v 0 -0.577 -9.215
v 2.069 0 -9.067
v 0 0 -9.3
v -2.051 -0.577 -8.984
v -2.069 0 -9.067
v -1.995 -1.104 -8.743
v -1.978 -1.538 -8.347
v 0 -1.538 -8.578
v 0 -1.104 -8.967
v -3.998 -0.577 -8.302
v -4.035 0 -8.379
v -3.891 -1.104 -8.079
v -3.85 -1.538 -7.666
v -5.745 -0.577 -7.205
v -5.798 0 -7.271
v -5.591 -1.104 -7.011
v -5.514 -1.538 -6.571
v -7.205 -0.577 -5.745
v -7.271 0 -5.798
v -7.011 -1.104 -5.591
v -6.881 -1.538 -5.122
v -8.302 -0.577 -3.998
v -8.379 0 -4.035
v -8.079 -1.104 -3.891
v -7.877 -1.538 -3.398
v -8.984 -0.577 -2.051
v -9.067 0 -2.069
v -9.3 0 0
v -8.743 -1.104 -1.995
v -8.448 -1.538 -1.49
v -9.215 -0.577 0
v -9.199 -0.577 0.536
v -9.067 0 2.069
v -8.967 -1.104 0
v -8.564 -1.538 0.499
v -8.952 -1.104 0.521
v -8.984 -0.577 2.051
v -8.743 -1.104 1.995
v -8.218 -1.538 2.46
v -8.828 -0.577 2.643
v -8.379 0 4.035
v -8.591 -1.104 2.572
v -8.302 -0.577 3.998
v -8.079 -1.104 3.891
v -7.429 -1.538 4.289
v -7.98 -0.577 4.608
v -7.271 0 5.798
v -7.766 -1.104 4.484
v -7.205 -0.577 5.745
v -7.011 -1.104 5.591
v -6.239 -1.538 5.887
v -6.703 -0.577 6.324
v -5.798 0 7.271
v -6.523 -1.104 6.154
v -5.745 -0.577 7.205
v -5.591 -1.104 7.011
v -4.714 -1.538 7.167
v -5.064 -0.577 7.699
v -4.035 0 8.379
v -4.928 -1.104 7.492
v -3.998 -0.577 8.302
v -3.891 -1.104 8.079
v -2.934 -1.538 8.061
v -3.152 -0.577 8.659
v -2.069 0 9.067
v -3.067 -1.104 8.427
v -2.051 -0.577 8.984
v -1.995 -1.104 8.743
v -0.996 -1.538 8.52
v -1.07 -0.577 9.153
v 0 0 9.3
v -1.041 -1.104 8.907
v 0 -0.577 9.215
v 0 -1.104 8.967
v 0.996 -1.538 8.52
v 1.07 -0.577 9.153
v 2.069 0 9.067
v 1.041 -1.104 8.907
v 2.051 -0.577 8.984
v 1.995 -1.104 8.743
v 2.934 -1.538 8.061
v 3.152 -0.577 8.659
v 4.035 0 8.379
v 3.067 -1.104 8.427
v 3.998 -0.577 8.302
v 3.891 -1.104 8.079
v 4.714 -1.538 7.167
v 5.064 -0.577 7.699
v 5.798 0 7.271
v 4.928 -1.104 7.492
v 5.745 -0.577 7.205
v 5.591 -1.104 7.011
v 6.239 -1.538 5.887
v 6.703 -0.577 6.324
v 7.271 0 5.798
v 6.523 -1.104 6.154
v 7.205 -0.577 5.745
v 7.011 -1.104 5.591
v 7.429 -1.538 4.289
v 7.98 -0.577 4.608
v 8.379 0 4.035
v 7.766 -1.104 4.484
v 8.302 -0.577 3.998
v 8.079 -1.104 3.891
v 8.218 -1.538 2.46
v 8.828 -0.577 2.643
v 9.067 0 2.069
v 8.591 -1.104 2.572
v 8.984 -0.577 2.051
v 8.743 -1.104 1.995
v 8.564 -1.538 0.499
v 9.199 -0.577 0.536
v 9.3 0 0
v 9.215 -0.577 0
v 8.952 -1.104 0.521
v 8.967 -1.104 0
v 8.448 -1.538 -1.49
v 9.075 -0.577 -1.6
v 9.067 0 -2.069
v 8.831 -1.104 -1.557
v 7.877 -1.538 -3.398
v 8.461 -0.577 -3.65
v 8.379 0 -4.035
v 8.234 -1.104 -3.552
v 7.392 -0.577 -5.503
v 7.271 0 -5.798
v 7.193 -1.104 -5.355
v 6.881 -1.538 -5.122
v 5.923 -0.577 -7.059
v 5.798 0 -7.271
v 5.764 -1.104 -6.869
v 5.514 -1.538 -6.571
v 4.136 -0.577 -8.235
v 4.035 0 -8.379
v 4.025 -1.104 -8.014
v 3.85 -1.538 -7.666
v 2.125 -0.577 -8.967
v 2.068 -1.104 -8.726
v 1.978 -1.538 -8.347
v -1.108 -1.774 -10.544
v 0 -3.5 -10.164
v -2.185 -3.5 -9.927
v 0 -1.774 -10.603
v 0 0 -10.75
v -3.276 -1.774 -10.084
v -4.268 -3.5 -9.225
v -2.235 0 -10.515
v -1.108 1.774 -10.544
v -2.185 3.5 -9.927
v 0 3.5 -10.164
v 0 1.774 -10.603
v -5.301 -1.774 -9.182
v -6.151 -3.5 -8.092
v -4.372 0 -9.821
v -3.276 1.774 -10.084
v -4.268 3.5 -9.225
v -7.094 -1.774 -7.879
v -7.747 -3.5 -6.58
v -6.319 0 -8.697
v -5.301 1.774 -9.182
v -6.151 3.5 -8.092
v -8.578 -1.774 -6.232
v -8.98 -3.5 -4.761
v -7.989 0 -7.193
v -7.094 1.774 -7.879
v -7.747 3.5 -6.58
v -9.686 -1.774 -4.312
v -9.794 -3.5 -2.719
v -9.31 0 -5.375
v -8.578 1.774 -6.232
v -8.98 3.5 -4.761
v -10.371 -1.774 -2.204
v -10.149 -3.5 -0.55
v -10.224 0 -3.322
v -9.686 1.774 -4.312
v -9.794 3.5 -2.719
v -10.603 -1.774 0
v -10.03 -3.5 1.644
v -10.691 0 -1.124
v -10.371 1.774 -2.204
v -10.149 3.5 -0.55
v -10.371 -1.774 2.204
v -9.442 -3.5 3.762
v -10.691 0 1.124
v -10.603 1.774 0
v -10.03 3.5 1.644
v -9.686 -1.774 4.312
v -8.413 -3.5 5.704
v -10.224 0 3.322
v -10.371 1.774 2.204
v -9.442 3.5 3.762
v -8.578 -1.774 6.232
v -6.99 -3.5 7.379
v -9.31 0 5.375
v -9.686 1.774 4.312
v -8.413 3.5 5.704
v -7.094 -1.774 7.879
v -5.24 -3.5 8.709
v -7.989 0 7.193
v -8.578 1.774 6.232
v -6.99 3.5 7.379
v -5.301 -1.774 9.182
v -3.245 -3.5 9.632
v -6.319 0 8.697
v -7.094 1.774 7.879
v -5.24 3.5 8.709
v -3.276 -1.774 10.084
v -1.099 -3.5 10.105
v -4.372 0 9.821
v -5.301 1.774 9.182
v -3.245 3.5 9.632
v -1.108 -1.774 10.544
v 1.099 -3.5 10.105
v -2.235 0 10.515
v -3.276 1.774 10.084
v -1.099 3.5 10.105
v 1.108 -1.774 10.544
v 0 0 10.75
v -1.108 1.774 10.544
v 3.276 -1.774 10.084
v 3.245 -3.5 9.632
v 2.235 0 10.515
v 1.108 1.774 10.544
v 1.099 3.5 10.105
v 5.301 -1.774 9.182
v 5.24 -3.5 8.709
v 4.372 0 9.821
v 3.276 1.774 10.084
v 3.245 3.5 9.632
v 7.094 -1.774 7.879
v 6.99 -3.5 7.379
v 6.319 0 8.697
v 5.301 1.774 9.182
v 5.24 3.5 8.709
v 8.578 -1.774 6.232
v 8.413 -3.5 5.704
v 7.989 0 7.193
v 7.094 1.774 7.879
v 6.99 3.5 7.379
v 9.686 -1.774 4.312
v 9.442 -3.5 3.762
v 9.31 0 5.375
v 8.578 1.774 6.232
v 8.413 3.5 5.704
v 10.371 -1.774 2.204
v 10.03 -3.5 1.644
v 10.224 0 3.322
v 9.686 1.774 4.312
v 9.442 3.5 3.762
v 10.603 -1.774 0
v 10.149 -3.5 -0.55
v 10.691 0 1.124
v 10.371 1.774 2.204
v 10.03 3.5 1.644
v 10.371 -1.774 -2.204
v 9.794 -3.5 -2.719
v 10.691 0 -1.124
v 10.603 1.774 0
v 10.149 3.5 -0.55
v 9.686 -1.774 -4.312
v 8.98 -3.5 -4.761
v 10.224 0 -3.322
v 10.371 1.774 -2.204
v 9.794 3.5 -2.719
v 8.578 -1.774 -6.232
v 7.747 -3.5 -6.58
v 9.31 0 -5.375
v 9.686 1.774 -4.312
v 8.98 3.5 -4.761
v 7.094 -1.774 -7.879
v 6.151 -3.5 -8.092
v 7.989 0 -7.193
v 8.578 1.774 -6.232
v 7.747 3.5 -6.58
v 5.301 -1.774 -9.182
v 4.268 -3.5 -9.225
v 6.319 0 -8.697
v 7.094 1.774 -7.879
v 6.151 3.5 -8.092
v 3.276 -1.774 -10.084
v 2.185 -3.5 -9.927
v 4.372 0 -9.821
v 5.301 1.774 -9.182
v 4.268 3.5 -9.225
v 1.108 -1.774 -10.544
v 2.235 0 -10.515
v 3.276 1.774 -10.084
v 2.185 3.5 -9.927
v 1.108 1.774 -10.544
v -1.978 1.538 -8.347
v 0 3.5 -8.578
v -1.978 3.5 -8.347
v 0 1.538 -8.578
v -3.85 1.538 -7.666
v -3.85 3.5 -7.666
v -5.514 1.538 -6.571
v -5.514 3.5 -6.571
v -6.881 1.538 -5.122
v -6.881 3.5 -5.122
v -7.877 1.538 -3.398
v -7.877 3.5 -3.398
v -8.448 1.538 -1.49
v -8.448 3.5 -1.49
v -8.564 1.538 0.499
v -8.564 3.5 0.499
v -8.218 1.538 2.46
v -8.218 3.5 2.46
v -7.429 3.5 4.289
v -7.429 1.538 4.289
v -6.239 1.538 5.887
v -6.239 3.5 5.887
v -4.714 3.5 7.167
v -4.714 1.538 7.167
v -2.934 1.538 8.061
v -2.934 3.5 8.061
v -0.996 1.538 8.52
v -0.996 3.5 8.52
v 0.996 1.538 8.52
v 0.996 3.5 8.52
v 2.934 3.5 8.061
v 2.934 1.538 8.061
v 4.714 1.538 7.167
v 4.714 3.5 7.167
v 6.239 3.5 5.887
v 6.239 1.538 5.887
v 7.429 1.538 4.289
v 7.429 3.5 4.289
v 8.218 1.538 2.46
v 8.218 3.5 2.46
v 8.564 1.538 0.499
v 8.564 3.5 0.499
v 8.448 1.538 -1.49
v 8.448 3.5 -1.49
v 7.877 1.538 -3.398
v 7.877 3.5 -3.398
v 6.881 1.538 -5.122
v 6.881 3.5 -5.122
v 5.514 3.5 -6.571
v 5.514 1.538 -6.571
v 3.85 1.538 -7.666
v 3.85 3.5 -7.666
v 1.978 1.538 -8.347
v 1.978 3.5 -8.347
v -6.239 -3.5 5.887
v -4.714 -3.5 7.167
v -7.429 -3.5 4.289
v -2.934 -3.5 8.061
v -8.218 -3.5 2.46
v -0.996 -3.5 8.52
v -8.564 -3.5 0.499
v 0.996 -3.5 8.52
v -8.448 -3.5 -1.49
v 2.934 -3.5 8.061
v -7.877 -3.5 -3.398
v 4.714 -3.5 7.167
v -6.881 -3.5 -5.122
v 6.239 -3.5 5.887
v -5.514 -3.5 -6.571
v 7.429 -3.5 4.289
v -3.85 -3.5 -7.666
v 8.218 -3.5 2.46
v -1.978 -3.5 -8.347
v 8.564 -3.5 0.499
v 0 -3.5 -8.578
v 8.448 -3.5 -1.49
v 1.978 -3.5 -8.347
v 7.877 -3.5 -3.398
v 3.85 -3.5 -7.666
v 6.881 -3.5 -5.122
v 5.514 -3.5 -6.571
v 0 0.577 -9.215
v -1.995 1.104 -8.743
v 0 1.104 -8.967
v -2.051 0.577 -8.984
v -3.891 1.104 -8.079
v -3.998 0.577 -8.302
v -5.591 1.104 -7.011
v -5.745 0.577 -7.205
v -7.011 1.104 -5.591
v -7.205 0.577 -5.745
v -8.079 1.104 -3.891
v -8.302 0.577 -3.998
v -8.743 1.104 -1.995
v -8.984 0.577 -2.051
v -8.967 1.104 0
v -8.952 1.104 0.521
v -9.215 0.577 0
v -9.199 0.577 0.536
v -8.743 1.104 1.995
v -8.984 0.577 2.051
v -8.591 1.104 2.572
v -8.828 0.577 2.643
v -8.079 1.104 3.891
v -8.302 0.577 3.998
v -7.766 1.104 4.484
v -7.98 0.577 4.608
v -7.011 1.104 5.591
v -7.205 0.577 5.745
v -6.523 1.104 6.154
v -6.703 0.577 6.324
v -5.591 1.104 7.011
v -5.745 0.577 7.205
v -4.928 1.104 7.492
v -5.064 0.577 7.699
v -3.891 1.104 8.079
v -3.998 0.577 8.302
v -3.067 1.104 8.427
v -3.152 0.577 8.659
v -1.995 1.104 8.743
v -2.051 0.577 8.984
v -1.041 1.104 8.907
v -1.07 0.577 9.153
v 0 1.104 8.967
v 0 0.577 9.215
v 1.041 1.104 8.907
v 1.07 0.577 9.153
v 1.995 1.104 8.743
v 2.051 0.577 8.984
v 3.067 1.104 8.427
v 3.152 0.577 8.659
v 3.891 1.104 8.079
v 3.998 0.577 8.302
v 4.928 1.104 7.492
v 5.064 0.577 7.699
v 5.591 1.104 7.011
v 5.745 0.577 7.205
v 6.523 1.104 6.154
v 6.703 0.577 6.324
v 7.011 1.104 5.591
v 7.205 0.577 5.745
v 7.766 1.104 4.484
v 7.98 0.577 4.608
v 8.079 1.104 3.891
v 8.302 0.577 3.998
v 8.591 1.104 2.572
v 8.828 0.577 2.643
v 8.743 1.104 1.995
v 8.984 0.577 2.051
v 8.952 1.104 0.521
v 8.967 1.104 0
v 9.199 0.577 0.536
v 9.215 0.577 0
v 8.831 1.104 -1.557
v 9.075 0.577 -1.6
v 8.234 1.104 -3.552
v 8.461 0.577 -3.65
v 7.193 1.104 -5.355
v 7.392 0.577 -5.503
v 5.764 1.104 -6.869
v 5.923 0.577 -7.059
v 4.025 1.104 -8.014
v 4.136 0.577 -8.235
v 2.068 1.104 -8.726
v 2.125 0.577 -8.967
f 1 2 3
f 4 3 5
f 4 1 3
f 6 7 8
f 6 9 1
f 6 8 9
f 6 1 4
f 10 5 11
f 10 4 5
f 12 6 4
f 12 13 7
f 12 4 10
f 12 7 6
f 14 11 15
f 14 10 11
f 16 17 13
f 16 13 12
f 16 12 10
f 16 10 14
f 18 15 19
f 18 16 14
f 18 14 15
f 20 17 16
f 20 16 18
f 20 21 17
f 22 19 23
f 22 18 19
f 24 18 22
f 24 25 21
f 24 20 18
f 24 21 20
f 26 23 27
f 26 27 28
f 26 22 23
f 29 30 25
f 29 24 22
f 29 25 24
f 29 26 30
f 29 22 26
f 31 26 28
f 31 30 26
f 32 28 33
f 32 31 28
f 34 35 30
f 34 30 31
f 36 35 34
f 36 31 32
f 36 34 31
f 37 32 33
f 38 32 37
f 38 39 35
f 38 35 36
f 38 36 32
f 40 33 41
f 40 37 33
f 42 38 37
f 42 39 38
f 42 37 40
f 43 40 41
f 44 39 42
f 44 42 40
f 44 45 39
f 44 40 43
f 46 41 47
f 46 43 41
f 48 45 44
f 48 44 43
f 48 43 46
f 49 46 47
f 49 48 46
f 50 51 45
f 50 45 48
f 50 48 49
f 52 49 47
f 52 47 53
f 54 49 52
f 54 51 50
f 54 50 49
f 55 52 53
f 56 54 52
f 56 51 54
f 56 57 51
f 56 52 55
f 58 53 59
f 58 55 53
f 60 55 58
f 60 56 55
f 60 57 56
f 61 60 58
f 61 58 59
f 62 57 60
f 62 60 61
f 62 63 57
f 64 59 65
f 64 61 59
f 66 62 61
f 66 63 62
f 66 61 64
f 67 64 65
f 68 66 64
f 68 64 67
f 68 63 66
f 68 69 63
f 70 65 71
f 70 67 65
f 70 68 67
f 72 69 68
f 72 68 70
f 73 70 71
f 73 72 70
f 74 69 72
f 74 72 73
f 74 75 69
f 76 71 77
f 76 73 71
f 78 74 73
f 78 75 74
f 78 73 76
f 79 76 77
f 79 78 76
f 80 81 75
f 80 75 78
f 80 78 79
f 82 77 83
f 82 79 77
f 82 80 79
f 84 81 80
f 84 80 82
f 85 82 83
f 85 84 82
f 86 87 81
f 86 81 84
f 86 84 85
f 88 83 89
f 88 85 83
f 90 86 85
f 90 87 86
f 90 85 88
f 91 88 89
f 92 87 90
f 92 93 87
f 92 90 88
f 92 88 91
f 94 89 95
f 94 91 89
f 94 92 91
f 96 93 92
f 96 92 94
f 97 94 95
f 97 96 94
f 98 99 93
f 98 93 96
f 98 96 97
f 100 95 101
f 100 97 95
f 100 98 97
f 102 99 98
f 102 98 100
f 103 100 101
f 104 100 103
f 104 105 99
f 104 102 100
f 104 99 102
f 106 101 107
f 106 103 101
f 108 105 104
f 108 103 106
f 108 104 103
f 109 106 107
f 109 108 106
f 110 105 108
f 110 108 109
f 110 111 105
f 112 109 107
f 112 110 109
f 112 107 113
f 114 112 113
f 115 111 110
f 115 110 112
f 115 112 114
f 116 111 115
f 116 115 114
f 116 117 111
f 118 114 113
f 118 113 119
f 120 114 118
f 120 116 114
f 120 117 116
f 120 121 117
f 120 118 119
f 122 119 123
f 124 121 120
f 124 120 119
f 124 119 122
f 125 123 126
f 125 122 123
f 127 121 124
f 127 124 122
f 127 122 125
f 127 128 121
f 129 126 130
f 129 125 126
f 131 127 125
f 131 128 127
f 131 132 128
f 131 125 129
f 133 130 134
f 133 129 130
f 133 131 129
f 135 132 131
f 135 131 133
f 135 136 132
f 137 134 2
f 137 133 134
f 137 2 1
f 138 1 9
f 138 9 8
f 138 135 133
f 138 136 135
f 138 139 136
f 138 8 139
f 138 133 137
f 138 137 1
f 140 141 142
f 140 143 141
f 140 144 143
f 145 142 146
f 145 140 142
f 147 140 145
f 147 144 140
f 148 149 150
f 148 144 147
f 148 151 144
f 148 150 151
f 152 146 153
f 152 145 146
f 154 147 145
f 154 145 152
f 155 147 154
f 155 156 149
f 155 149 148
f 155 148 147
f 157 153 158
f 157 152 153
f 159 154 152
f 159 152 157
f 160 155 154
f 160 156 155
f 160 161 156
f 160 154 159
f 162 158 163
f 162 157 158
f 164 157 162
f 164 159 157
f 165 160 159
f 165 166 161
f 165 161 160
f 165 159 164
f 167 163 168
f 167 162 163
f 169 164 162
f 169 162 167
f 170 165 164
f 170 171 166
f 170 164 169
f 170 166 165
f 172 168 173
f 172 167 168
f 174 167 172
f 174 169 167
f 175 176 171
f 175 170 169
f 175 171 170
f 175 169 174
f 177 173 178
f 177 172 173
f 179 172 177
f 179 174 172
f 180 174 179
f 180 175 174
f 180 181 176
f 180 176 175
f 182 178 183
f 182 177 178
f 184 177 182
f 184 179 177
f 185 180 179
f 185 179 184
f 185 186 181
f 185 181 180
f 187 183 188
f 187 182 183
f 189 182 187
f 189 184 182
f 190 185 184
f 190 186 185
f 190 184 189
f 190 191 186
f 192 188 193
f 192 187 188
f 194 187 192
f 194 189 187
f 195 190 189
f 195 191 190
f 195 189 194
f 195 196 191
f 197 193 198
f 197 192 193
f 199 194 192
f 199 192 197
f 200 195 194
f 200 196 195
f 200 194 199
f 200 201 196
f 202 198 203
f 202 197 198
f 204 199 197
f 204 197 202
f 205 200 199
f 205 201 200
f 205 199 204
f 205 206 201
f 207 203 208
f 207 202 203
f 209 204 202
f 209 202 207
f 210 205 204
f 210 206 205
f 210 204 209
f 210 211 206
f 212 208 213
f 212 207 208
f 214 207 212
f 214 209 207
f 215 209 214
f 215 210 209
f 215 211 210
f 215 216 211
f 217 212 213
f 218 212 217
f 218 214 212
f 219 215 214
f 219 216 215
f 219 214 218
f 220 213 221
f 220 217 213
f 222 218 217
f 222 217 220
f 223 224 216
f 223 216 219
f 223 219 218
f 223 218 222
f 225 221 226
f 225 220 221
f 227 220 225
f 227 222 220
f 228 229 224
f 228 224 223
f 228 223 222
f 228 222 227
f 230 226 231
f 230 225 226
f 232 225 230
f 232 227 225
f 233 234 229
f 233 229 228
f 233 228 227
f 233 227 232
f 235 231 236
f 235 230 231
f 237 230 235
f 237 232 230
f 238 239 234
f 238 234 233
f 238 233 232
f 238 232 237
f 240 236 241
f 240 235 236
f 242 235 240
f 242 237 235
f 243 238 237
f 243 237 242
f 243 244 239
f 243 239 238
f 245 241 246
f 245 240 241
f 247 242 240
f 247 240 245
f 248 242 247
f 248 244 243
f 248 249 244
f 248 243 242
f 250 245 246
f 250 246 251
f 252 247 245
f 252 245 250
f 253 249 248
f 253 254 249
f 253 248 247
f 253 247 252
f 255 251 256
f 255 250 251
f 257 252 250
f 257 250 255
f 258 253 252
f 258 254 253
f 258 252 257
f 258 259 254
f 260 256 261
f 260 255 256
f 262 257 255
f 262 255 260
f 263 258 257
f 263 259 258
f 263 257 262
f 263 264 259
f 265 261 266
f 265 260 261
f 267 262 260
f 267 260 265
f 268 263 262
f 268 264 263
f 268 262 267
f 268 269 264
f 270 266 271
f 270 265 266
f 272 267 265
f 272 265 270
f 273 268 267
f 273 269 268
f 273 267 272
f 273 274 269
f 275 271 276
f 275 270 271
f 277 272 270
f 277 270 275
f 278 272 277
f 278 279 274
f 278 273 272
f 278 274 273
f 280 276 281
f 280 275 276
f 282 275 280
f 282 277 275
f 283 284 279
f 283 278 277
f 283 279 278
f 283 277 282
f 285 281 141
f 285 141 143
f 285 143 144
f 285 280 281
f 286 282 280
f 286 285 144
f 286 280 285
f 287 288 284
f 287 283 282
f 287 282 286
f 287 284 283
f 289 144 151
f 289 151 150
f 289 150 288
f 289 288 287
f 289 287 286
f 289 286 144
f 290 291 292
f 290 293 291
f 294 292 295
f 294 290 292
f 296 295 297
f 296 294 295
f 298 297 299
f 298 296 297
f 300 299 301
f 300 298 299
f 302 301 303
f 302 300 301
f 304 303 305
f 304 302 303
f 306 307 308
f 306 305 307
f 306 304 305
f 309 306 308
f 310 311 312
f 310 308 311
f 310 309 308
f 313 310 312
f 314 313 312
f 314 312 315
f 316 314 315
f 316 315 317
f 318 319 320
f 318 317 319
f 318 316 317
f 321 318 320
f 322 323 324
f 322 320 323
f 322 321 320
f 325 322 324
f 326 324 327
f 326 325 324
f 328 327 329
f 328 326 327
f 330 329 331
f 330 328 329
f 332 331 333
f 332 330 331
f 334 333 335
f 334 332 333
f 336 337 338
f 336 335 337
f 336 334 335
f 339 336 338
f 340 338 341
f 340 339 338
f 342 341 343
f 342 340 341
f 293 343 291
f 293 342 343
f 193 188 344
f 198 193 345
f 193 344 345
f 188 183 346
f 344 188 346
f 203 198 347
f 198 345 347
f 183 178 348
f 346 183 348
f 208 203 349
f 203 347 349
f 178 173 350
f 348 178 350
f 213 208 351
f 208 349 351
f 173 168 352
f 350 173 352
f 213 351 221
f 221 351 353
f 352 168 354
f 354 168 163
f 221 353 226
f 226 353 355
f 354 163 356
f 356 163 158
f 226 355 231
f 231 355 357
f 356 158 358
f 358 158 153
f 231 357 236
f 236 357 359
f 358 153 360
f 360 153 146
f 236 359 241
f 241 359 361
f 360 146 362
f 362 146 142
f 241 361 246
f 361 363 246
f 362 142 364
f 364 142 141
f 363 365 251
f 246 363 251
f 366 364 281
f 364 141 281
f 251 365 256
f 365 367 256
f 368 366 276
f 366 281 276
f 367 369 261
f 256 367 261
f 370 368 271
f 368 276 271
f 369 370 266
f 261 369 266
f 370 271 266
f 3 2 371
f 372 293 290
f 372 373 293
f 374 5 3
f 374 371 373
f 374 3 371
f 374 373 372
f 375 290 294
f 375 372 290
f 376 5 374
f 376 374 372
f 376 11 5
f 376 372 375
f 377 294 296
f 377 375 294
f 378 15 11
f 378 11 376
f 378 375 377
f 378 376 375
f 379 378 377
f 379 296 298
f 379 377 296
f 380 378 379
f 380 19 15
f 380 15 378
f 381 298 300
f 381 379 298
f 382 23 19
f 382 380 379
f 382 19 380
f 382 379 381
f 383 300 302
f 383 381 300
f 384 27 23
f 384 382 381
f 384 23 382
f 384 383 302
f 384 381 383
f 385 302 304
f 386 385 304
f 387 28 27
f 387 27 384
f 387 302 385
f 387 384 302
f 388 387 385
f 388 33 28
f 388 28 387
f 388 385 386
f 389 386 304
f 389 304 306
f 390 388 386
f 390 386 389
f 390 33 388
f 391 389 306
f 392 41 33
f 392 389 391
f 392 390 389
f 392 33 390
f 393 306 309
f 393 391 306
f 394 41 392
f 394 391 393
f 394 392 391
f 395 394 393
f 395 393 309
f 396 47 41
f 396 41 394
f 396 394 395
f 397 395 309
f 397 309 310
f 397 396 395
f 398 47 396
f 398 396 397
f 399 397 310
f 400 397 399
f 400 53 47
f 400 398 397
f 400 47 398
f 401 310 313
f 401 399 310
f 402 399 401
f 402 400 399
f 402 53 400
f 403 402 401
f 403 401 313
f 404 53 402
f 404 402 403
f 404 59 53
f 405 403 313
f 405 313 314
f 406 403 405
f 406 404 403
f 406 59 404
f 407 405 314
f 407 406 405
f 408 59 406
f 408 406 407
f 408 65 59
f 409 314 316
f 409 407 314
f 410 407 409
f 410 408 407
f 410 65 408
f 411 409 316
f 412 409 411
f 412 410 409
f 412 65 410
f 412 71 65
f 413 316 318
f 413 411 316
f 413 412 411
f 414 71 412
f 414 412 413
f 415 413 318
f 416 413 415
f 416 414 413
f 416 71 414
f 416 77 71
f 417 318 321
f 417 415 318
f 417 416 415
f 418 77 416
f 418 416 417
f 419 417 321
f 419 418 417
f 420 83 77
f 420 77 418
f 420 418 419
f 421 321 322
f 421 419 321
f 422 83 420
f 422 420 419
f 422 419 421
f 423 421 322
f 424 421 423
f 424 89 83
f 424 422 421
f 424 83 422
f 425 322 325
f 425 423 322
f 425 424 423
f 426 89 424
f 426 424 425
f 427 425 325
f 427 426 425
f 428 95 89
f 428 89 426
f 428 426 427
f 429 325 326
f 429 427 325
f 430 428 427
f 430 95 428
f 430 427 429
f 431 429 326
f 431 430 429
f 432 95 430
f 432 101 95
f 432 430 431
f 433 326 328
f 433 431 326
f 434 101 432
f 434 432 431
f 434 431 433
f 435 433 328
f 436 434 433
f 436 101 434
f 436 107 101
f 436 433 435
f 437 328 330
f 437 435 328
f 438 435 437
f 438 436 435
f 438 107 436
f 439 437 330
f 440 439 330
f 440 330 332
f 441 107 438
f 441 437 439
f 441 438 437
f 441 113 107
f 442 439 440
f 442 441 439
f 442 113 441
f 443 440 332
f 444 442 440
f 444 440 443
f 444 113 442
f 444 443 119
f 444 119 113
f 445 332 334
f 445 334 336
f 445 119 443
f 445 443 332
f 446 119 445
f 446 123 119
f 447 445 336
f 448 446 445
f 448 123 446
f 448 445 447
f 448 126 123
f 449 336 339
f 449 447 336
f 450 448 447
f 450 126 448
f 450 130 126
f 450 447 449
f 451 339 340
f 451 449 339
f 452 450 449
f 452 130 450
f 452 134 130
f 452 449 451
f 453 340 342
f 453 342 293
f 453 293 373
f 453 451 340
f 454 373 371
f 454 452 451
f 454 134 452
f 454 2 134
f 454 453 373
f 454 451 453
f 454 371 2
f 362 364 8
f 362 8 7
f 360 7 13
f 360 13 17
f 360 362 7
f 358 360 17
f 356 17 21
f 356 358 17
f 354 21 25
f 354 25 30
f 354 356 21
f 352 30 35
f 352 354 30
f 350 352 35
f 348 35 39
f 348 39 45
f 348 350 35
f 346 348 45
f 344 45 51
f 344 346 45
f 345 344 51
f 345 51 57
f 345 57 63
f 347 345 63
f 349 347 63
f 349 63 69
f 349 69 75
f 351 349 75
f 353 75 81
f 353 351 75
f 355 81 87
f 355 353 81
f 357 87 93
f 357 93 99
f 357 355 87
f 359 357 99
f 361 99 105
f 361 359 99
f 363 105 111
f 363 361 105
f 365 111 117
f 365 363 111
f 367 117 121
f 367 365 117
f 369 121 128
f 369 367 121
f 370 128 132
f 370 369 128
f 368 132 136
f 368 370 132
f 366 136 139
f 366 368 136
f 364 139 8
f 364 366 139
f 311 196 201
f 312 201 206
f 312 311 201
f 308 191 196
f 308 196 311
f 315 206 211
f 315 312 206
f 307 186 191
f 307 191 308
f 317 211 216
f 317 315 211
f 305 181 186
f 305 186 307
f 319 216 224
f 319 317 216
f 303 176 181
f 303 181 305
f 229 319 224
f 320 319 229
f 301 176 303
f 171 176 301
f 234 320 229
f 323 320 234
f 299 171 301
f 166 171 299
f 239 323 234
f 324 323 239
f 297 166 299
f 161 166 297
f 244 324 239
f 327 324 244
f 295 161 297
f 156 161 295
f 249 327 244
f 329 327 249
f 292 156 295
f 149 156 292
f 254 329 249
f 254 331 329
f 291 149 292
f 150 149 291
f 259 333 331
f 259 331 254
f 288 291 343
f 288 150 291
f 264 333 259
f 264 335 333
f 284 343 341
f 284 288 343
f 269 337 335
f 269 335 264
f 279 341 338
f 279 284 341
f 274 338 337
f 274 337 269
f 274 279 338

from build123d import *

# Parameters (mm, degrees)
CUT_EXTRUDE1_DEPTH      = 16.720209922
CUT_EXTRUDE1_DEPTH_BACK = 16.720209922
SKETCH3_W               = 21.5
SKETCH3_H               = 0.5


with BuildPart() as part:
    # Sketch2 → Revolve1 (revolve)
    with BuildSketch(Plane.XY):
        with BuildLine():
            Line((8.578101022, -1.538329541), (8.578101022, -4))
            Line((8.578101022, -4), (9.978101022, -4))
            ThreePointArc((9.978101022, -4), (10.75, 0), (9.978101022, 4))
            Line((9.978101022, 4), (8.578101022, 4))
            Line((8.578101022, 4), (8.578101022, 1.538329541))
            ThreePointArc((8.578101022, 1.538329541), (9.110552684, 0.849646384), (9.3, 0))
            ThreePointArc((9.3, 0), (9.110552684, -0.849646384), (8.578101022, -1.538329541))
        make_face()
    revolve(axis=Axis((0, 0, 0), (0, 1, 0)))

    # Sketch3 → Cut-Extrude1 (cut, two sides: drawn at the far end of the back side and taken through both)
    with BuildSketch(Plane.XY.offset(-CUT_EXTRUDE1_DEPTH_BACK)):
        with Locations((0, 3.75)):
            Rectangle(SKETCH3_W, SKETCH3_H)
        with Locations((0, -3.75)):
            Rectangle(SKETCH3_W, SKETCH3_H)
    extrude(amount=CUT_EXTRUDE1_DEPTH + CUT_EXTRUDE1_DEPTH_BACK, mode=Mode.SUBTRACT)


solid = part.part
